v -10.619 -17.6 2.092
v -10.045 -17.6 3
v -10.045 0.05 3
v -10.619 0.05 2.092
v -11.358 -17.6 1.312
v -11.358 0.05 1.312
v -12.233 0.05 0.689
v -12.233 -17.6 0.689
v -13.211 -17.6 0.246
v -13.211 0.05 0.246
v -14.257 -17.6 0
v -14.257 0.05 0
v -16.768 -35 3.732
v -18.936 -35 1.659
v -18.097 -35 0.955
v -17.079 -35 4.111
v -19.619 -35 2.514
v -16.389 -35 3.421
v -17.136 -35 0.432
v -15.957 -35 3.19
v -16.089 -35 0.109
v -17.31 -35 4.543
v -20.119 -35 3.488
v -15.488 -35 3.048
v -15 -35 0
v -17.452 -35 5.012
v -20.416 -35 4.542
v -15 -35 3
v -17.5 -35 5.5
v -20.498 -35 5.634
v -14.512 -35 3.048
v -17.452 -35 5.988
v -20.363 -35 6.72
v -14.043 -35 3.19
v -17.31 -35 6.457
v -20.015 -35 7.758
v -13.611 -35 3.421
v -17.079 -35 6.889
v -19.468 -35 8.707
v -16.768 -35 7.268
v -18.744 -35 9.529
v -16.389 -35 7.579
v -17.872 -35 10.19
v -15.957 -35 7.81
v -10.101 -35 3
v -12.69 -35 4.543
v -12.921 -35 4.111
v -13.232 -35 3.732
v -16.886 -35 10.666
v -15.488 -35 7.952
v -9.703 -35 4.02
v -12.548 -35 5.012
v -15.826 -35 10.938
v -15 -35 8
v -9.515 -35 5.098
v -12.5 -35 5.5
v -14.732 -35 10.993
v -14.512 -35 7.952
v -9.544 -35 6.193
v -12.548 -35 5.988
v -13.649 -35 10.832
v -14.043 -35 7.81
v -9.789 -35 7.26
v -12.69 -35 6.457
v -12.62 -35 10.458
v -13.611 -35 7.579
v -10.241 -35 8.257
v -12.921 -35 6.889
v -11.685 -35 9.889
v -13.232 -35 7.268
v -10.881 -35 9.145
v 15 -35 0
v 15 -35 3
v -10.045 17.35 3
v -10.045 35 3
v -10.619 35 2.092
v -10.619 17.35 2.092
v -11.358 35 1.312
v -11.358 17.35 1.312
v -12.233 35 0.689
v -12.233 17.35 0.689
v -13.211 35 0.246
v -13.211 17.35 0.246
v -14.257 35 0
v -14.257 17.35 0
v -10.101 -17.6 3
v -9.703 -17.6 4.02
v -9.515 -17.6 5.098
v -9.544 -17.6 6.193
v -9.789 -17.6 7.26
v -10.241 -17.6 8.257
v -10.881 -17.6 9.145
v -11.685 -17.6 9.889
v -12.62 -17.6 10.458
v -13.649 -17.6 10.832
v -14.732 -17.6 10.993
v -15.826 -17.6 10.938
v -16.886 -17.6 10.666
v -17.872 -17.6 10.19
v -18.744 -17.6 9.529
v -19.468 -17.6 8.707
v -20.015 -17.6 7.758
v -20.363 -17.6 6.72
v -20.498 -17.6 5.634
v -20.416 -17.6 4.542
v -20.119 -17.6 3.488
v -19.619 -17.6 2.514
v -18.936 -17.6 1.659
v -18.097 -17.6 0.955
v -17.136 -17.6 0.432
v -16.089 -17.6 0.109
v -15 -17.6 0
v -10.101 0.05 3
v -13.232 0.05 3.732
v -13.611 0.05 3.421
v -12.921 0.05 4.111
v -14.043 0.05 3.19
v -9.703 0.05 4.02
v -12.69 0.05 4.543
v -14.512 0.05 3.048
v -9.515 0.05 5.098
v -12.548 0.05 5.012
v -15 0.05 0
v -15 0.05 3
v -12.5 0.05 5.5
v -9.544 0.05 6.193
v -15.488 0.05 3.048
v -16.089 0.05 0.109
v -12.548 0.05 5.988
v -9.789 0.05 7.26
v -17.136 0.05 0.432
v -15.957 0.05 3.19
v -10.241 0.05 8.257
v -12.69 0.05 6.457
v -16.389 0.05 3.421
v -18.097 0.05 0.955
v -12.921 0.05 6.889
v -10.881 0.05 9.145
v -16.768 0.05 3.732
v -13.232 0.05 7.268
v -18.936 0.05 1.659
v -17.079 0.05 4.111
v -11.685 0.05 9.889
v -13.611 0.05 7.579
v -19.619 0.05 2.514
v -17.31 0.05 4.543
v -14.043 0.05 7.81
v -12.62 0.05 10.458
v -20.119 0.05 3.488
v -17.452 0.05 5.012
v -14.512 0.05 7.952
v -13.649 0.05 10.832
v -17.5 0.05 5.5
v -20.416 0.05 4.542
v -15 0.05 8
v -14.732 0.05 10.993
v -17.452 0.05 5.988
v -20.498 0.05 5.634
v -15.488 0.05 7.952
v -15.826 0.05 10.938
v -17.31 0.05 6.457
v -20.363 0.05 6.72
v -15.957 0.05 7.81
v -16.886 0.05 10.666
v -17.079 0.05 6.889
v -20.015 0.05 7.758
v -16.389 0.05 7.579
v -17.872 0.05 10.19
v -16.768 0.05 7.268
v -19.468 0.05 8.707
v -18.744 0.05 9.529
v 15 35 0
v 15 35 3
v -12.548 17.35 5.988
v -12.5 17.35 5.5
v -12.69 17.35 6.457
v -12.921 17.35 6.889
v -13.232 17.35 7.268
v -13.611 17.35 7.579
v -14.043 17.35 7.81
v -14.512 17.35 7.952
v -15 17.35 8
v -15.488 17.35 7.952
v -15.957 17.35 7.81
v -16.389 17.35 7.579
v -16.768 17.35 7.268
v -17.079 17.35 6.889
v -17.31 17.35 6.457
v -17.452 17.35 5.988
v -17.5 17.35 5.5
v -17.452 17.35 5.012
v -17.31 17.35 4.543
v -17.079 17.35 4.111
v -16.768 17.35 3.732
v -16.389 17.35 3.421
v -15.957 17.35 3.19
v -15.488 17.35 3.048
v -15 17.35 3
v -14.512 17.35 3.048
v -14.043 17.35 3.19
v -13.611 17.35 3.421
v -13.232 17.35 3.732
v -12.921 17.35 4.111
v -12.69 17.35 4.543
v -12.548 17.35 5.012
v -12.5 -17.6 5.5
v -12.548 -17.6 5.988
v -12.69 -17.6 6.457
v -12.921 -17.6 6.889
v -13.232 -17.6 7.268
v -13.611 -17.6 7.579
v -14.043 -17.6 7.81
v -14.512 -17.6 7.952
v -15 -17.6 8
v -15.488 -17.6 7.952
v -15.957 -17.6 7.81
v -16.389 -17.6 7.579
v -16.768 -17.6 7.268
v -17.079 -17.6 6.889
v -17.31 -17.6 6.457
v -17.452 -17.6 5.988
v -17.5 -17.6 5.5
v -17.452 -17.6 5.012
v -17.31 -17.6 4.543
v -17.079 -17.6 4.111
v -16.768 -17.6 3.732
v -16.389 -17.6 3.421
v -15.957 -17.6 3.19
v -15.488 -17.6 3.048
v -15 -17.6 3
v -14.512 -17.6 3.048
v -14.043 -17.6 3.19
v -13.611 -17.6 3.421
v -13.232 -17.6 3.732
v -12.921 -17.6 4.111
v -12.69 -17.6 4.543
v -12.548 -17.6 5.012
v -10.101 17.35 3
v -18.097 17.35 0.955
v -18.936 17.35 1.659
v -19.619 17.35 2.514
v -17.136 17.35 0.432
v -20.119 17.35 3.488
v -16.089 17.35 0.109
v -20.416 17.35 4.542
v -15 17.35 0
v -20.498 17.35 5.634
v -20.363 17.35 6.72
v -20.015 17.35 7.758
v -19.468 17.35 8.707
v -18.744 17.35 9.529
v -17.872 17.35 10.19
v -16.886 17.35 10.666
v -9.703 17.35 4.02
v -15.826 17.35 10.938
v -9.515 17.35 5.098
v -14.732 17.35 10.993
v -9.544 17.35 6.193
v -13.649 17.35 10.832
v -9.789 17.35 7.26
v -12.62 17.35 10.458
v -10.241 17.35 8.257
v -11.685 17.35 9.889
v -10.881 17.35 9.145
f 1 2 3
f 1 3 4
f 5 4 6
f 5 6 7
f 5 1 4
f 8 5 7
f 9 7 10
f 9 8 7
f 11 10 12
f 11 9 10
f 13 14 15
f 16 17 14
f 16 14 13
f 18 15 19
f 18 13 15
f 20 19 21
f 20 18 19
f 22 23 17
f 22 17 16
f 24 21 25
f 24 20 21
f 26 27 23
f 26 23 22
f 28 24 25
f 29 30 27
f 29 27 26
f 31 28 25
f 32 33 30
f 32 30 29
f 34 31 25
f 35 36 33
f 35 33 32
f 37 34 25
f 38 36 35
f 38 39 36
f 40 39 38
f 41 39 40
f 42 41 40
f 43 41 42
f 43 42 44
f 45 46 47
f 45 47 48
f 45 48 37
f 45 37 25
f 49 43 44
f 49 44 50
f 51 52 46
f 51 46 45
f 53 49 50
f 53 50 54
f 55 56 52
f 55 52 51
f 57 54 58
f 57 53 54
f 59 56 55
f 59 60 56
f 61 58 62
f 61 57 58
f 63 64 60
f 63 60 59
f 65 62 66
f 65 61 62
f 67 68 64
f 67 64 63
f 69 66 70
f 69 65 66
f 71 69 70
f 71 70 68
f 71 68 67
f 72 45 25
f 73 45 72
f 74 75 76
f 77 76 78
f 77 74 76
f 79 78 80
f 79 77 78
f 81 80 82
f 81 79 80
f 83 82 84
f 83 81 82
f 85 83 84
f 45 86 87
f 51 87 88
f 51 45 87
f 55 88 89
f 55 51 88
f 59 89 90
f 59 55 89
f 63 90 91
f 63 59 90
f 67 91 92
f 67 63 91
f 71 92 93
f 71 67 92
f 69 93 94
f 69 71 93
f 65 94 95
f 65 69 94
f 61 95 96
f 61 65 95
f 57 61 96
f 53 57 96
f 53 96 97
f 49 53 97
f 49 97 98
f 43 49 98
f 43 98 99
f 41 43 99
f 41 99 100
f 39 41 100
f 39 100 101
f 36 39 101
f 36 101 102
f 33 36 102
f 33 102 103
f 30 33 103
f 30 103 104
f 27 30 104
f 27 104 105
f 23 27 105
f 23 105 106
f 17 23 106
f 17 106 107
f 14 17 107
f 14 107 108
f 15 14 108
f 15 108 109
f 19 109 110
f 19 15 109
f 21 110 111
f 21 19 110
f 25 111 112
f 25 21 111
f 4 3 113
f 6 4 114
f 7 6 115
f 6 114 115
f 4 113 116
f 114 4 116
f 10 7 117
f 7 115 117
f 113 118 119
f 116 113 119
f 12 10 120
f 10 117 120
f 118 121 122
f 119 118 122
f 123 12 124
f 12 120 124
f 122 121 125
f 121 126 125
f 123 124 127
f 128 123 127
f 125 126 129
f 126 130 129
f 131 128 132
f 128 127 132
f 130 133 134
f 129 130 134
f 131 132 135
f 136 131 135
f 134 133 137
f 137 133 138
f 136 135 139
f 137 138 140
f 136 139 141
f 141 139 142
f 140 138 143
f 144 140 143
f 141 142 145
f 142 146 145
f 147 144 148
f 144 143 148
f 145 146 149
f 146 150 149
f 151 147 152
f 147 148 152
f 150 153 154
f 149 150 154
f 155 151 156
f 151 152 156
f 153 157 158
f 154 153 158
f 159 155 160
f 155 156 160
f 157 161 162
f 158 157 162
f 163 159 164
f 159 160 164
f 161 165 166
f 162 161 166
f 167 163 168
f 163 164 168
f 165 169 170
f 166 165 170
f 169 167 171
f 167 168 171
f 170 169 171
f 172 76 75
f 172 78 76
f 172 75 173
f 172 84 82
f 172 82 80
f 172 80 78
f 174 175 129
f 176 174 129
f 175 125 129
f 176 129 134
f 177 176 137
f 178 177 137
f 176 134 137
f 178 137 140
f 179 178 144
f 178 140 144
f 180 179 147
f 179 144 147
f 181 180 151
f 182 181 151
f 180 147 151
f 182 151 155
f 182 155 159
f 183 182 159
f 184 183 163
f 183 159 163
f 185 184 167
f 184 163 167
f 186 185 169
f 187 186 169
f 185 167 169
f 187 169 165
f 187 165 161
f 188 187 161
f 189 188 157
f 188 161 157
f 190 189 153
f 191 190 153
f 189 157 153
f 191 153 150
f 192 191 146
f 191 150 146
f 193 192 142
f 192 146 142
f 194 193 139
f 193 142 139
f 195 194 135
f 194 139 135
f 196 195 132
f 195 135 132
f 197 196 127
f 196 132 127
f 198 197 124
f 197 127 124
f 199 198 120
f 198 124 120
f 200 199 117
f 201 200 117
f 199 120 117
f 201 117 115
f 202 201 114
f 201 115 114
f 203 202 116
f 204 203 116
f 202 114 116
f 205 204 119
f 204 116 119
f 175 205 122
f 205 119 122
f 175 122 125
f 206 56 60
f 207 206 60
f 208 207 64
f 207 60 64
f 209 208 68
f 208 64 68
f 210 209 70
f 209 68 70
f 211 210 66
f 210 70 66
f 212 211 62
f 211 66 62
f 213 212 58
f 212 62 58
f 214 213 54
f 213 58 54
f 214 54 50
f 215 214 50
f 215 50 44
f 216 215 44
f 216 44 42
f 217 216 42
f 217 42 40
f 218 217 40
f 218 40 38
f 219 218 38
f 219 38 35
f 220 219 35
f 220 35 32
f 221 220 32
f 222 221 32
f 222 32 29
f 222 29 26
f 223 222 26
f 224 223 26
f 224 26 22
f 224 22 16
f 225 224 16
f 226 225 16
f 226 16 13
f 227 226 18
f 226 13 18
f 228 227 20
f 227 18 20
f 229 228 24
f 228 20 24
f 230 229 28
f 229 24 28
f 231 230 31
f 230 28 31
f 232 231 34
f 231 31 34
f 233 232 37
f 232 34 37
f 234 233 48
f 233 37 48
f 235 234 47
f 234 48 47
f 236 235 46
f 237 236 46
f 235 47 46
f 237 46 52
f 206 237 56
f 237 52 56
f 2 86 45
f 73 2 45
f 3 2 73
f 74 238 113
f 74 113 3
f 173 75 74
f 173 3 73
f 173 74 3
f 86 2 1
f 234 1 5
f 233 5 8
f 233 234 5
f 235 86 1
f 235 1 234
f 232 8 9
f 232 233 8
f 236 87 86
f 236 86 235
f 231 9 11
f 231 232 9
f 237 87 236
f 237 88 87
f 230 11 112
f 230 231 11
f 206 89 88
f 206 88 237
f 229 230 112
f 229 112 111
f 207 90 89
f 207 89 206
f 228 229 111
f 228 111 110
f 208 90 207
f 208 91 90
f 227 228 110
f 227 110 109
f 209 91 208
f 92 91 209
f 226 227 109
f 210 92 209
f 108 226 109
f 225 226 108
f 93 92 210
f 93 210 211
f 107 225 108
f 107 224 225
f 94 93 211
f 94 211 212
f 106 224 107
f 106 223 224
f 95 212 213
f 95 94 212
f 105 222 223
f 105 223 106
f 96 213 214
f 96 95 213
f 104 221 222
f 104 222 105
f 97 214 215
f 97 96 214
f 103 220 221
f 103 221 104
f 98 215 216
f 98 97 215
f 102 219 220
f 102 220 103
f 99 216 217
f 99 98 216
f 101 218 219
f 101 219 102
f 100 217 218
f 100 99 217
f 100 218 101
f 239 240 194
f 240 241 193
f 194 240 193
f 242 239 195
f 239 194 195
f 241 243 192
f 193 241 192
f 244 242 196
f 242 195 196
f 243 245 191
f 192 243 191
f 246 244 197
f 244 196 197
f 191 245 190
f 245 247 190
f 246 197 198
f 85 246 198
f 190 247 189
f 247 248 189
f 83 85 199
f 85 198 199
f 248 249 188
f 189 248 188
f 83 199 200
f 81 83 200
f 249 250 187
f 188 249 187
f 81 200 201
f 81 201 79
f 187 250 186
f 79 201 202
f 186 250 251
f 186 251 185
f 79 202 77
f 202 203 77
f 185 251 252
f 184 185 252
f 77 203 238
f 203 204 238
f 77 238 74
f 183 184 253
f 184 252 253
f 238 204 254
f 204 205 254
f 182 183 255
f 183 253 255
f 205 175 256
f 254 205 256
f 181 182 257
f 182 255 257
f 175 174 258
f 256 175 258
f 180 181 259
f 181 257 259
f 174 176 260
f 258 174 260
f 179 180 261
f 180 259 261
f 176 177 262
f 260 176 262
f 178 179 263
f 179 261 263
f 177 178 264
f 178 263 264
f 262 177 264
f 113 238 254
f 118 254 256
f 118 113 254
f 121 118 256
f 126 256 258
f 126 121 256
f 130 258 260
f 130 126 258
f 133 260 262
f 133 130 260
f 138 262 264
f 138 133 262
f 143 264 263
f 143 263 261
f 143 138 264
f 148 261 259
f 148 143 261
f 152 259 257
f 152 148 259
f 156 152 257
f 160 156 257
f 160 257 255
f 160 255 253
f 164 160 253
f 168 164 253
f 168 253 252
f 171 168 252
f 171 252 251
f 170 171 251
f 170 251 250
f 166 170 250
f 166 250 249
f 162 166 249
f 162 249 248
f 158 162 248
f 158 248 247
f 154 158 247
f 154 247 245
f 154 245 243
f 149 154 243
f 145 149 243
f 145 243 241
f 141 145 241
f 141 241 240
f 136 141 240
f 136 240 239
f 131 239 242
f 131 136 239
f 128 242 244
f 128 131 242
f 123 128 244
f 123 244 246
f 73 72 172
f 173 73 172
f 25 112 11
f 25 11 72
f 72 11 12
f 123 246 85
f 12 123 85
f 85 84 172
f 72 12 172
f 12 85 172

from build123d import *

# Parameters (mm, degrees)
SKETCH_W            = 30
SKETCH_H            = 70
PAD_DEPTH           = 3
SKETCH001_R         = 5.5
SKETCH001_R_2       = 2.5
PAD001_DEPTH        = 17.4
LINEARPATTERN_COUNT = 2
LINEARPATTERN_PITCH = 34.95
SKETCH006_R         = 5.55
POCKET_DEPTH        = 17.65
SKETCH007_R         = 5.55
POCKET003_DEPTH     = 17.65


with BuildPart() as part:
    # Sketch → Pad (new body)
    with BuildSketch(Plane.XY):
        Rectangle(SKETCH_W, SKETCH_H)
    extrude(amount=PAD_DEPTH)

    # Sketch001 (on Face1 of Pad) → Pad001 (join)
    with BuildSketch(Plane.XZ.offset(35)):
        with Locations((-15, 5.5)):
            Circle(SKETCH001_R)
        with Locations((-15, 5.5)):
            Circle(SKETCH001_R_2, mode=Mode.SUBTRACT)
    pad001 = extrude(amount=-PAD001_DEPTH)

    # LinearPattern: Pad001 ×2
    with Locations(*[(0, i * LINEARPATTERN_PITCH, 0) for i in range(1, LINEARPATTERN_COUNT)]):
        add(pad001)

    # Sketch006 (on Face12 of MultiTransform) → Pocket (cut)
    with BuildSketch(Plane(origin=(0, -17.6, 0), x_dir=(-1, 0, 0), z_dir=(0, 1, 0))):
        with Locations((15, 5.5)):
            Circle(SKETCH006_R)
    extrude(amount=POCKET_DEPTH, mode=Mode.SUBTRACT)

    # Sketch007 (on Face12 of Pocket) → Pocket003 (cut)
    with BuildSketch(Plane(origin=(0, 17.35, 0), x_dir=(-1, 0, 0), z_dir=(0, 1, 0))):
        with Locations((15, 5.5)):
            Circle(SKETCH007_R)
    extrude(amount=POCKET003_DEPTH, mode=Mode.SUBTRACT)


solid = part.part
